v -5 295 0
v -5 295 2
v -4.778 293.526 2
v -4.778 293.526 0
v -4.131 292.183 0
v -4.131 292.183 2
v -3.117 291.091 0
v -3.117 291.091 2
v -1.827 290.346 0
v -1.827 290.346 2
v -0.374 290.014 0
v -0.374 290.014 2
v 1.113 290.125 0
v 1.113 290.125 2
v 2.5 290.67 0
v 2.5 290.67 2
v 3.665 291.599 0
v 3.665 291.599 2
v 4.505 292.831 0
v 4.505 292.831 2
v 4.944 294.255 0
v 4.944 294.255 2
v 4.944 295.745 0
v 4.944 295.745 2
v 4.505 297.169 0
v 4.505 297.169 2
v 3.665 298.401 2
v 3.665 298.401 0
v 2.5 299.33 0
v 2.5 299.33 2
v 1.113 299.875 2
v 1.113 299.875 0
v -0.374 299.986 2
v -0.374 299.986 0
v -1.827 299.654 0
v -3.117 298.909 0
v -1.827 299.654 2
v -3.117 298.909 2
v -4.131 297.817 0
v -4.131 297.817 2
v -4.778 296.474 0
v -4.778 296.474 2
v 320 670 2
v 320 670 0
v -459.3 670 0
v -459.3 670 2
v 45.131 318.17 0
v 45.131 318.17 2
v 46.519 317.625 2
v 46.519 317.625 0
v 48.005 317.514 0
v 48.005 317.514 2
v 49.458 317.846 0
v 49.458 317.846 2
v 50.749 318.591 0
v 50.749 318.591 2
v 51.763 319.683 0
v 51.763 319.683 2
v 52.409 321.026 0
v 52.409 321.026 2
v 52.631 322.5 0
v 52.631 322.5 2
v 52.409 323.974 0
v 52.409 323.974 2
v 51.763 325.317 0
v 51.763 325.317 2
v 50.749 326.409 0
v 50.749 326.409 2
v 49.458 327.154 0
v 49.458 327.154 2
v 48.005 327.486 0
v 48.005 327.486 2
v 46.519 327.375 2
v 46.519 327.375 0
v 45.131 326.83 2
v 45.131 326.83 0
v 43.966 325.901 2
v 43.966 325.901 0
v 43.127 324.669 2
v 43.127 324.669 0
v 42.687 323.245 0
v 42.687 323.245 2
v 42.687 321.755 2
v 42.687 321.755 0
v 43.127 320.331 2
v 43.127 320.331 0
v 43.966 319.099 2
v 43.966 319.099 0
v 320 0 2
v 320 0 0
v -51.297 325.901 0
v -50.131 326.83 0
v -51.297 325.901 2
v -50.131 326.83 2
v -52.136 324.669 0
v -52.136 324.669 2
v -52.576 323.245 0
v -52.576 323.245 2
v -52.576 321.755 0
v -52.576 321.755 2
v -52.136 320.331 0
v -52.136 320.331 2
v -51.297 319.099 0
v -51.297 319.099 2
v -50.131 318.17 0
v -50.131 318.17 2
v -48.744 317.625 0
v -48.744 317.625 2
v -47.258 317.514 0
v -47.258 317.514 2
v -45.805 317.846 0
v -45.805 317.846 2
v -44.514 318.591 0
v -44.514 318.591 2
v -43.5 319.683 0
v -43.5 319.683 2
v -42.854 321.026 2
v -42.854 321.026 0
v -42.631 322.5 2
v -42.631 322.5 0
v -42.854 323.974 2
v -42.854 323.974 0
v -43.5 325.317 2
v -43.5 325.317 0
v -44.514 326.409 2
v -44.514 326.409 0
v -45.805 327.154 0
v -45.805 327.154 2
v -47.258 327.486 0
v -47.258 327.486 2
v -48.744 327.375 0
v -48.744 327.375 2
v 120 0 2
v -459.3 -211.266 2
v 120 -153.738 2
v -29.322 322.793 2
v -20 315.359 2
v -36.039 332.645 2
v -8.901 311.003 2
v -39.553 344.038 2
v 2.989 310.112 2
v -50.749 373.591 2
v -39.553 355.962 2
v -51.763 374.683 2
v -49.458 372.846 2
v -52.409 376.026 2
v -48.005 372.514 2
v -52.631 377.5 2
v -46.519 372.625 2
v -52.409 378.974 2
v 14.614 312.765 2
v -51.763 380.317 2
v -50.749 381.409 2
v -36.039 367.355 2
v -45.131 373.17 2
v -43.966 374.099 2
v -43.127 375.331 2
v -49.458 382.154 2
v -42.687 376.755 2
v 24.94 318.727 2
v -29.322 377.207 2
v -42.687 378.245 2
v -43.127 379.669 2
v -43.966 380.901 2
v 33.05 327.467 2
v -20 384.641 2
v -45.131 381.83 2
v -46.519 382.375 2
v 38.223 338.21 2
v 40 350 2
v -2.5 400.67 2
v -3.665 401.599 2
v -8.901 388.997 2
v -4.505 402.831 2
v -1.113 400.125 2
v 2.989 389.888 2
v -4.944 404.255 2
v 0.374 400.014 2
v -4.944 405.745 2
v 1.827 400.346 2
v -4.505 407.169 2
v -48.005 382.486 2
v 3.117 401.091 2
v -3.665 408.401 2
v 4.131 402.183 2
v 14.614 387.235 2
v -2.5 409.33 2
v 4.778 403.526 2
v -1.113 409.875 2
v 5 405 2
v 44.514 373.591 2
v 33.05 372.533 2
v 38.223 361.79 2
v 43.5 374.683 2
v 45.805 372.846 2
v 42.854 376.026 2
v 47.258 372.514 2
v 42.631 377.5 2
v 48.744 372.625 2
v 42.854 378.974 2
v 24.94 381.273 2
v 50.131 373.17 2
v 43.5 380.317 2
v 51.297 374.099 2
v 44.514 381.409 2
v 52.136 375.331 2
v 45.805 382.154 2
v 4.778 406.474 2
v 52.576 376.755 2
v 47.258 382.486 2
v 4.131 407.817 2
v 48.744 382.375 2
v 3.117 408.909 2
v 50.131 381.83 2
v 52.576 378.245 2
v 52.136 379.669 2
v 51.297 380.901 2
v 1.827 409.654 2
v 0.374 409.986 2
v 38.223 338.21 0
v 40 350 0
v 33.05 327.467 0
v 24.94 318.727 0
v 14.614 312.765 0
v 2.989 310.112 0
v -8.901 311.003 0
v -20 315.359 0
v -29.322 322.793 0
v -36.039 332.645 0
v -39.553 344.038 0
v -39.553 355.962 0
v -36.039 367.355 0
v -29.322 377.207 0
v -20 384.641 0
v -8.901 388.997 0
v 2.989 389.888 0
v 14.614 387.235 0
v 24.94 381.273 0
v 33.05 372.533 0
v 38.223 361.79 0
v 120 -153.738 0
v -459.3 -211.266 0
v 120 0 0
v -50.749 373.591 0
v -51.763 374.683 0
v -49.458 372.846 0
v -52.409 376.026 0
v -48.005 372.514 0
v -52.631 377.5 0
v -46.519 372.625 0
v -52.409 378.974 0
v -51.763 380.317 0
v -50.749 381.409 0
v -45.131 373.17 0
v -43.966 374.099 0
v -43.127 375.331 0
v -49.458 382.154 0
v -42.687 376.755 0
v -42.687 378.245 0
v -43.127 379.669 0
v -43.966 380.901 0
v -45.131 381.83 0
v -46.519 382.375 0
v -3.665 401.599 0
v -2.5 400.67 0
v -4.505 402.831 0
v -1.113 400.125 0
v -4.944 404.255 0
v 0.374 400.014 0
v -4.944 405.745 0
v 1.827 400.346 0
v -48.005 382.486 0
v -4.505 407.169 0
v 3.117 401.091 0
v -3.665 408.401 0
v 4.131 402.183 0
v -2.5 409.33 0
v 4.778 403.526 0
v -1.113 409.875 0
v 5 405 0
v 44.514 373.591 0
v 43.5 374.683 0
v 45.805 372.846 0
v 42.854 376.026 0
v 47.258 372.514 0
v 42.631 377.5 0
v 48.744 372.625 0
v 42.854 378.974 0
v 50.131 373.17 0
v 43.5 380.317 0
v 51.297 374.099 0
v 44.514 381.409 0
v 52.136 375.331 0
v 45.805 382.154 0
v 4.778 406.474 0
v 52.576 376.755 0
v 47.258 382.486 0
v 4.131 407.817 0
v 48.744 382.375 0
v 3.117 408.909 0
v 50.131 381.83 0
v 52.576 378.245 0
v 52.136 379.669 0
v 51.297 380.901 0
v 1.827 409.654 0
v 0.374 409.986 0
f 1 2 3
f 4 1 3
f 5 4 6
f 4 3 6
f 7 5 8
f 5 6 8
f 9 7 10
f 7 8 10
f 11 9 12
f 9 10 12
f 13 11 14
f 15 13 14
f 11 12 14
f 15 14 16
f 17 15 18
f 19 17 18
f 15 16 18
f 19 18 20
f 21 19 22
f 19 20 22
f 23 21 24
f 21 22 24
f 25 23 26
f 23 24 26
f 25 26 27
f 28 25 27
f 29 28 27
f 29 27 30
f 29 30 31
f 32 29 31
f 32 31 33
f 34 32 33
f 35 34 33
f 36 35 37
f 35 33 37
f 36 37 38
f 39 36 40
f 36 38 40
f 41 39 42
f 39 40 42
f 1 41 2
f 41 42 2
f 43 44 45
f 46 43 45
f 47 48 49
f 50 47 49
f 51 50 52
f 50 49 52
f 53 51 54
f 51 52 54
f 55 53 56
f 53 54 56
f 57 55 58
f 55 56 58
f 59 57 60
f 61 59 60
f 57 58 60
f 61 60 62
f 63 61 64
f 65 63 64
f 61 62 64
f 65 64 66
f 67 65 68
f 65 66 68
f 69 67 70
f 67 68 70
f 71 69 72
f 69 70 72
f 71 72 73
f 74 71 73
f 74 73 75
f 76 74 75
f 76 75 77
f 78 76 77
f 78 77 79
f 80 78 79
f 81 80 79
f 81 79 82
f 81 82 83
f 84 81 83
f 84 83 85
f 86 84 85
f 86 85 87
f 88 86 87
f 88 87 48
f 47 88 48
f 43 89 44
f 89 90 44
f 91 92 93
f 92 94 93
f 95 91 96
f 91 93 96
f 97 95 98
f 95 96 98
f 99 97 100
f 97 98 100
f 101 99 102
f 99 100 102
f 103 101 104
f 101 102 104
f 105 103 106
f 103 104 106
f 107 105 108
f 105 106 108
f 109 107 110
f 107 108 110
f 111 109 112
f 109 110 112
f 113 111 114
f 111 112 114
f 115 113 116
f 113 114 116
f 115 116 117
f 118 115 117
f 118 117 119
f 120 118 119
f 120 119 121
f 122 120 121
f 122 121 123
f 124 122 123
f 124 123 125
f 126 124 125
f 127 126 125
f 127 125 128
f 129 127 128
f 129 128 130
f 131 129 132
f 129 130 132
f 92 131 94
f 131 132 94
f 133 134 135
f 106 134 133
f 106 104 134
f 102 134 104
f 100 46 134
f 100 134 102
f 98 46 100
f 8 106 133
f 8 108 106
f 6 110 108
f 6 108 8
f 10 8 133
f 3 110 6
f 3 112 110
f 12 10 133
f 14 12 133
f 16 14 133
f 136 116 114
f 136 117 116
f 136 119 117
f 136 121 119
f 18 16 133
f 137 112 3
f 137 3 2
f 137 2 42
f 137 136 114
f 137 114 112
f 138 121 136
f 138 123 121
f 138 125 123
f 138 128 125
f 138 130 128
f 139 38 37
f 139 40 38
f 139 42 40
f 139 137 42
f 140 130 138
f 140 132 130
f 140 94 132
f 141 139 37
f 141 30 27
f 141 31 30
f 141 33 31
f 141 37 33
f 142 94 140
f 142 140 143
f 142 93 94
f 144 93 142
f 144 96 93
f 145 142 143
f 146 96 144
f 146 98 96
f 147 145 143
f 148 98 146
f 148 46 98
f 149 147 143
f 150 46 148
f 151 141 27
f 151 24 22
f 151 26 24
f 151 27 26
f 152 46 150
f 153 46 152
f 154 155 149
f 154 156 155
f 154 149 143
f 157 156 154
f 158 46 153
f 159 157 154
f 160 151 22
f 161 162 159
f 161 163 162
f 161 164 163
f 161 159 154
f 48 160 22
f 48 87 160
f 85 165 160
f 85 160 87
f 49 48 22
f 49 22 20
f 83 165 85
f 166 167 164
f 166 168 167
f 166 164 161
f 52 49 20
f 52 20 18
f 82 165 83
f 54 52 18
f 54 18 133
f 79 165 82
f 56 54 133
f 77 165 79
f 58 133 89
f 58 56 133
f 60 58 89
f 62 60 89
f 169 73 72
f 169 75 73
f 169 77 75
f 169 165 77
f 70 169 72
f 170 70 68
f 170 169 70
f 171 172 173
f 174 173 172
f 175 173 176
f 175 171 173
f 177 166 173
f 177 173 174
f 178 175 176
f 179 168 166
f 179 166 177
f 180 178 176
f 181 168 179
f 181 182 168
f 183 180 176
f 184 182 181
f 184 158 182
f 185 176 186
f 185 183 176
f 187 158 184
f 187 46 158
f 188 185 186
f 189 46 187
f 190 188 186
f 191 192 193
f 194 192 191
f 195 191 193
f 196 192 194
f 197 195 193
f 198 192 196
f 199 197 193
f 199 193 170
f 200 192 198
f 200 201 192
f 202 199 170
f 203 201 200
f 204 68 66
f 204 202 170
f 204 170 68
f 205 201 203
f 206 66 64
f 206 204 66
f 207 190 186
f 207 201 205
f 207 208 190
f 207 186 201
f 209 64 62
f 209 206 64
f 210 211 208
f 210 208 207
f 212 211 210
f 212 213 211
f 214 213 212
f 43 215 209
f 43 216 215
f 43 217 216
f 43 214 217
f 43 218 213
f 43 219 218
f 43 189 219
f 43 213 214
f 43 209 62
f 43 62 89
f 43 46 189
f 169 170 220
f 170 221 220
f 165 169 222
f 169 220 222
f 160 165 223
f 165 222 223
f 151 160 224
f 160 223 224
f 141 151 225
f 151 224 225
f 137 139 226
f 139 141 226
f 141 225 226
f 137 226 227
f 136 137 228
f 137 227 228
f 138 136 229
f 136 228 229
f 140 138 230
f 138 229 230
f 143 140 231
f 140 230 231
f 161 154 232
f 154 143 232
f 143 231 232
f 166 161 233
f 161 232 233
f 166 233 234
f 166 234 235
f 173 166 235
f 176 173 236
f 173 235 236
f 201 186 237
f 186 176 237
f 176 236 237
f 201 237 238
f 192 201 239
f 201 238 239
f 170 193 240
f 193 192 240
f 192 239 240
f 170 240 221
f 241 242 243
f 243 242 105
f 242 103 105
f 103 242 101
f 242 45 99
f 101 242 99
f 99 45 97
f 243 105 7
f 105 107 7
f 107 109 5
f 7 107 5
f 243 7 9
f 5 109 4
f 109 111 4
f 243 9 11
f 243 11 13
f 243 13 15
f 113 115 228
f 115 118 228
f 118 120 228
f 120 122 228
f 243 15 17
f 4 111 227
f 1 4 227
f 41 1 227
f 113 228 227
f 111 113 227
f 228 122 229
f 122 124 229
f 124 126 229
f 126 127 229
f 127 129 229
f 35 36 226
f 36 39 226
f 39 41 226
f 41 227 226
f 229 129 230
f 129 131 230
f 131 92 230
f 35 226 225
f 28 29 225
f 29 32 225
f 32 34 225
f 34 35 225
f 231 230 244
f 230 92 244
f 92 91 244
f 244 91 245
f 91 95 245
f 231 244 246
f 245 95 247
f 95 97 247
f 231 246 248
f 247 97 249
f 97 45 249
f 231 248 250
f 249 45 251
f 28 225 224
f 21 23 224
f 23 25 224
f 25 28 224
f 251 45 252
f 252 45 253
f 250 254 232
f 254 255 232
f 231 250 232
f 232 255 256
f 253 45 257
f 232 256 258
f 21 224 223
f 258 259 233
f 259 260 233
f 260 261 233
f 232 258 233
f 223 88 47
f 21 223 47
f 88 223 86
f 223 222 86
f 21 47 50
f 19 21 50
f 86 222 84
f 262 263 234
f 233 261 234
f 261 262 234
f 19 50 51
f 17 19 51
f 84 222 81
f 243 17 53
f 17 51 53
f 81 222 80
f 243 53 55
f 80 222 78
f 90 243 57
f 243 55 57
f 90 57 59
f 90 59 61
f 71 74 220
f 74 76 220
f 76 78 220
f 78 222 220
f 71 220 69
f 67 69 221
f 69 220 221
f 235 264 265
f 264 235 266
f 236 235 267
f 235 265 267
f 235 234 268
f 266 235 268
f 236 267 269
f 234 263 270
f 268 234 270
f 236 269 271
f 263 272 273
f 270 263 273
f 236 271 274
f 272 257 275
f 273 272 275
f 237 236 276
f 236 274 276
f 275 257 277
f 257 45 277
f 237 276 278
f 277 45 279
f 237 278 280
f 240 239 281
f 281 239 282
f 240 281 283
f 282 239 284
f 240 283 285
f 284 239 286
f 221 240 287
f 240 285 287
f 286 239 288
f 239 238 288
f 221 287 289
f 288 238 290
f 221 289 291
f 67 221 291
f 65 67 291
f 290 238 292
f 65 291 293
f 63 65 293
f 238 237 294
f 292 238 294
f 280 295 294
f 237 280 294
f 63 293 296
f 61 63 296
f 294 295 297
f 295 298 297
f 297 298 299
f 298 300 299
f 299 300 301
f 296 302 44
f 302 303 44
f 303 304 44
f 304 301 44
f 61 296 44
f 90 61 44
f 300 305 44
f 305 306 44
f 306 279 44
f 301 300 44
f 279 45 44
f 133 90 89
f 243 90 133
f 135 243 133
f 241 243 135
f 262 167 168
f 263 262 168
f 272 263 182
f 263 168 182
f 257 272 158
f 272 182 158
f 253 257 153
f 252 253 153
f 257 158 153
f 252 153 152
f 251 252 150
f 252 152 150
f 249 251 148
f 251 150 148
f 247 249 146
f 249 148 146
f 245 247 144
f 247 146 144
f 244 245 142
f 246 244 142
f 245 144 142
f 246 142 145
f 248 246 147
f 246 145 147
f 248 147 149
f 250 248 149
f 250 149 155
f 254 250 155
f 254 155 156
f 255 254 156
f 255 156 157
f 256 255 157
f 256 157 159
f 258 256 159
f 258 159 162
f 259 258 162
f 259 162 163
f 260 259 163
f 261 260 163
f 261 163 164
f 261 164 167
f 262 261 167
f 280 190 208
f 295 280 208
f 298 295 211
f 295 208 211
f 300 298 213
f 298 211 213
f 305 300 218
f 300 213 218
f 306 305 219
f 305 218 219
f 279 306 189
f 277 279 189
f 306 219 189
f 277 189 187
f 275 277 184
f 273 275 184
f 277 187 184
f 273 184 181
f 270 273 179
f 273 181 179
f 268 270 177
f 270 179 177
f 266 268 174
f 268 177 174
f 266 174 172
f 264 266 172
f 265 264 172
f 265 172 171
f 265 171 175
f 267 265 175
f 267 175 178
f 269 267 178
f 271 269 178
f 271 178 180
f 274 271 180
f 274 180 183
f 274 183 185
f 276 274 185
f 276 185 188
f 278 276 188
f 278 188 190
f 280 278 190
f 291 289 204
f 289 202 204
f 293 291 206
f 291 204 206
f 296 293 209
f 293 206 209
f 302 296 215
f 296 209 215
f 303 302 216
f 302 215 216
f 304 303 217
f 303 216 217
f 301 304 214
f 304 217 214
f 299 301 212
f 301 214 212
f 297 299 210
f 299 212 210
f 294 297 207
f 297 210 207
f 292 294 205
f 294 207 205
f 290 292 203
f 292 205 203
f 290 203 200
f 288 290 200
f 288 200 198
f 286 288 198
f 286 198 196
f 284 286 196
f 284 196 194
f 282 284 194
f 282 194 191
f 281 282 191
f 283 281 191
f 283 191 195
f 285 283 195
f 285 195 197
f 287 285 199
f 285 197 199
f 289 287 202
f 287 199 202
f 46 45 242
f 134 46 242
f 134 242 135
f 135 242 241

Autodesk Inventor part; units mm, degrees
ref_plane "YZ Plane" through (0, 0, 0) normal (1, 0, 0) x (0, 1, 0)
ref_plane "XZ Plane" through (0, 0, 0) normal (0, 1, 0) x (-1, 0, 0)
ref_plane "XY Plane" through (0, 0, 0) normal (0, 0, 1) x (1, 0, 0)
sketch "Sketch1" plane through (0, 0, 0) normal (0, 0, 1) x (1, 0, 0)
  line L0 (-459.3004, -153.7378) -> (320, -153.7378)
  line L1 (320, -153.7378) -> (320, 670)
  line L2 (320, 670) -> (-459.3004, 670)
  line L3 (-459.3004, 670) -> (-459.3004, -153.7378)
  line L4 (120, -153.7378) -> (320, 0)
  circle A0 centre (0, 350) radius 40
  line L5 (320, 0) -> (120, 0)
  line L6 (120, 0) -> (120, -153.7378)
  line L7 (-459.3004, -153.7378) -> (-459.3004, -211.2657)
  line L8 (-459.3004, -211.2657) -> (120, -153.7378)
  point P0 (0, 0)
  dimension "d14" = 80
  dimension "d15" = 320
  dimension "d16" = 200
  dimension "d17" = 320
  dimension "d18" = 350
extrude "Plate1" add sketch "Sketch1" along normal blind 2 contours L3 L2 L1 L5 L6 L0 | L0 L8 L7
sketch "Sketch2" plane through (0, 0, 0) normal (0, 0, -1) x (-1, 0, 0)
  line L0 (-300, 650) -> (-100, 650) construction
  line L1 (-100, 650) -> (-100, 630) construction
  line L2 (-100, 630) -> (-300, 630) construction
  line L3 (-300, 630) -> (-300, 650) construction
  line L4 (-320, 670) -> (459.3004, 670) projected
  line L5 (-320, 0) -> (-320, 670) projected
  point P0 (0, 0)
  point P1 (-48, 100)
  point P2 (459.3004, 670)
  point P3 (-251, -525)
  point P4 (-50, 98)
  dimension "d6" = 200
  dimension "d9" = 20
  dimension "d10" = 20
  dimension "d11" = 20
mark "Mark1"
sketch "Sketch3" plane through (0, 0, 2) normal (0, 0, 1) x (1, 0, 0)
  circle A0 centre (0, 405) radius 5
  circle A1 centre (0, 350) radius 40 projected
  point P0 (0, 0)
  dimension "d19" = 10
  dimension "d20" = 55
extrude "Cut1" cut sketch "Sketch3" against normal through all contours A0
pattern_circular "Circular Pattern1" count 6 over 360 about axis through (0, 350, 0) along (0, 0, 1) of "Cut1"
equation "\"d2\" = Thickness"
equation "\"BendReliefWidth\" = Thickness"
equation "\"BendReliefDepth\" = 0.5 * Thickness"
equation "\"CornerReliefSize\" = 4 * Thickness"
equation "\"MinimumRemnant\" = 2 * Thickness"
equation "\"TransitionRadius\" = BendRadius"
equation "\"JacobiRadiusSize\" = BendRadius"
equation "\"GapSize\" = Thickness"
equation "\"Thickness\" = 2"
equation "\"BendRadius\" = 2.75"
properties part number "TRM 016 right board main+" material "AISI 304"
